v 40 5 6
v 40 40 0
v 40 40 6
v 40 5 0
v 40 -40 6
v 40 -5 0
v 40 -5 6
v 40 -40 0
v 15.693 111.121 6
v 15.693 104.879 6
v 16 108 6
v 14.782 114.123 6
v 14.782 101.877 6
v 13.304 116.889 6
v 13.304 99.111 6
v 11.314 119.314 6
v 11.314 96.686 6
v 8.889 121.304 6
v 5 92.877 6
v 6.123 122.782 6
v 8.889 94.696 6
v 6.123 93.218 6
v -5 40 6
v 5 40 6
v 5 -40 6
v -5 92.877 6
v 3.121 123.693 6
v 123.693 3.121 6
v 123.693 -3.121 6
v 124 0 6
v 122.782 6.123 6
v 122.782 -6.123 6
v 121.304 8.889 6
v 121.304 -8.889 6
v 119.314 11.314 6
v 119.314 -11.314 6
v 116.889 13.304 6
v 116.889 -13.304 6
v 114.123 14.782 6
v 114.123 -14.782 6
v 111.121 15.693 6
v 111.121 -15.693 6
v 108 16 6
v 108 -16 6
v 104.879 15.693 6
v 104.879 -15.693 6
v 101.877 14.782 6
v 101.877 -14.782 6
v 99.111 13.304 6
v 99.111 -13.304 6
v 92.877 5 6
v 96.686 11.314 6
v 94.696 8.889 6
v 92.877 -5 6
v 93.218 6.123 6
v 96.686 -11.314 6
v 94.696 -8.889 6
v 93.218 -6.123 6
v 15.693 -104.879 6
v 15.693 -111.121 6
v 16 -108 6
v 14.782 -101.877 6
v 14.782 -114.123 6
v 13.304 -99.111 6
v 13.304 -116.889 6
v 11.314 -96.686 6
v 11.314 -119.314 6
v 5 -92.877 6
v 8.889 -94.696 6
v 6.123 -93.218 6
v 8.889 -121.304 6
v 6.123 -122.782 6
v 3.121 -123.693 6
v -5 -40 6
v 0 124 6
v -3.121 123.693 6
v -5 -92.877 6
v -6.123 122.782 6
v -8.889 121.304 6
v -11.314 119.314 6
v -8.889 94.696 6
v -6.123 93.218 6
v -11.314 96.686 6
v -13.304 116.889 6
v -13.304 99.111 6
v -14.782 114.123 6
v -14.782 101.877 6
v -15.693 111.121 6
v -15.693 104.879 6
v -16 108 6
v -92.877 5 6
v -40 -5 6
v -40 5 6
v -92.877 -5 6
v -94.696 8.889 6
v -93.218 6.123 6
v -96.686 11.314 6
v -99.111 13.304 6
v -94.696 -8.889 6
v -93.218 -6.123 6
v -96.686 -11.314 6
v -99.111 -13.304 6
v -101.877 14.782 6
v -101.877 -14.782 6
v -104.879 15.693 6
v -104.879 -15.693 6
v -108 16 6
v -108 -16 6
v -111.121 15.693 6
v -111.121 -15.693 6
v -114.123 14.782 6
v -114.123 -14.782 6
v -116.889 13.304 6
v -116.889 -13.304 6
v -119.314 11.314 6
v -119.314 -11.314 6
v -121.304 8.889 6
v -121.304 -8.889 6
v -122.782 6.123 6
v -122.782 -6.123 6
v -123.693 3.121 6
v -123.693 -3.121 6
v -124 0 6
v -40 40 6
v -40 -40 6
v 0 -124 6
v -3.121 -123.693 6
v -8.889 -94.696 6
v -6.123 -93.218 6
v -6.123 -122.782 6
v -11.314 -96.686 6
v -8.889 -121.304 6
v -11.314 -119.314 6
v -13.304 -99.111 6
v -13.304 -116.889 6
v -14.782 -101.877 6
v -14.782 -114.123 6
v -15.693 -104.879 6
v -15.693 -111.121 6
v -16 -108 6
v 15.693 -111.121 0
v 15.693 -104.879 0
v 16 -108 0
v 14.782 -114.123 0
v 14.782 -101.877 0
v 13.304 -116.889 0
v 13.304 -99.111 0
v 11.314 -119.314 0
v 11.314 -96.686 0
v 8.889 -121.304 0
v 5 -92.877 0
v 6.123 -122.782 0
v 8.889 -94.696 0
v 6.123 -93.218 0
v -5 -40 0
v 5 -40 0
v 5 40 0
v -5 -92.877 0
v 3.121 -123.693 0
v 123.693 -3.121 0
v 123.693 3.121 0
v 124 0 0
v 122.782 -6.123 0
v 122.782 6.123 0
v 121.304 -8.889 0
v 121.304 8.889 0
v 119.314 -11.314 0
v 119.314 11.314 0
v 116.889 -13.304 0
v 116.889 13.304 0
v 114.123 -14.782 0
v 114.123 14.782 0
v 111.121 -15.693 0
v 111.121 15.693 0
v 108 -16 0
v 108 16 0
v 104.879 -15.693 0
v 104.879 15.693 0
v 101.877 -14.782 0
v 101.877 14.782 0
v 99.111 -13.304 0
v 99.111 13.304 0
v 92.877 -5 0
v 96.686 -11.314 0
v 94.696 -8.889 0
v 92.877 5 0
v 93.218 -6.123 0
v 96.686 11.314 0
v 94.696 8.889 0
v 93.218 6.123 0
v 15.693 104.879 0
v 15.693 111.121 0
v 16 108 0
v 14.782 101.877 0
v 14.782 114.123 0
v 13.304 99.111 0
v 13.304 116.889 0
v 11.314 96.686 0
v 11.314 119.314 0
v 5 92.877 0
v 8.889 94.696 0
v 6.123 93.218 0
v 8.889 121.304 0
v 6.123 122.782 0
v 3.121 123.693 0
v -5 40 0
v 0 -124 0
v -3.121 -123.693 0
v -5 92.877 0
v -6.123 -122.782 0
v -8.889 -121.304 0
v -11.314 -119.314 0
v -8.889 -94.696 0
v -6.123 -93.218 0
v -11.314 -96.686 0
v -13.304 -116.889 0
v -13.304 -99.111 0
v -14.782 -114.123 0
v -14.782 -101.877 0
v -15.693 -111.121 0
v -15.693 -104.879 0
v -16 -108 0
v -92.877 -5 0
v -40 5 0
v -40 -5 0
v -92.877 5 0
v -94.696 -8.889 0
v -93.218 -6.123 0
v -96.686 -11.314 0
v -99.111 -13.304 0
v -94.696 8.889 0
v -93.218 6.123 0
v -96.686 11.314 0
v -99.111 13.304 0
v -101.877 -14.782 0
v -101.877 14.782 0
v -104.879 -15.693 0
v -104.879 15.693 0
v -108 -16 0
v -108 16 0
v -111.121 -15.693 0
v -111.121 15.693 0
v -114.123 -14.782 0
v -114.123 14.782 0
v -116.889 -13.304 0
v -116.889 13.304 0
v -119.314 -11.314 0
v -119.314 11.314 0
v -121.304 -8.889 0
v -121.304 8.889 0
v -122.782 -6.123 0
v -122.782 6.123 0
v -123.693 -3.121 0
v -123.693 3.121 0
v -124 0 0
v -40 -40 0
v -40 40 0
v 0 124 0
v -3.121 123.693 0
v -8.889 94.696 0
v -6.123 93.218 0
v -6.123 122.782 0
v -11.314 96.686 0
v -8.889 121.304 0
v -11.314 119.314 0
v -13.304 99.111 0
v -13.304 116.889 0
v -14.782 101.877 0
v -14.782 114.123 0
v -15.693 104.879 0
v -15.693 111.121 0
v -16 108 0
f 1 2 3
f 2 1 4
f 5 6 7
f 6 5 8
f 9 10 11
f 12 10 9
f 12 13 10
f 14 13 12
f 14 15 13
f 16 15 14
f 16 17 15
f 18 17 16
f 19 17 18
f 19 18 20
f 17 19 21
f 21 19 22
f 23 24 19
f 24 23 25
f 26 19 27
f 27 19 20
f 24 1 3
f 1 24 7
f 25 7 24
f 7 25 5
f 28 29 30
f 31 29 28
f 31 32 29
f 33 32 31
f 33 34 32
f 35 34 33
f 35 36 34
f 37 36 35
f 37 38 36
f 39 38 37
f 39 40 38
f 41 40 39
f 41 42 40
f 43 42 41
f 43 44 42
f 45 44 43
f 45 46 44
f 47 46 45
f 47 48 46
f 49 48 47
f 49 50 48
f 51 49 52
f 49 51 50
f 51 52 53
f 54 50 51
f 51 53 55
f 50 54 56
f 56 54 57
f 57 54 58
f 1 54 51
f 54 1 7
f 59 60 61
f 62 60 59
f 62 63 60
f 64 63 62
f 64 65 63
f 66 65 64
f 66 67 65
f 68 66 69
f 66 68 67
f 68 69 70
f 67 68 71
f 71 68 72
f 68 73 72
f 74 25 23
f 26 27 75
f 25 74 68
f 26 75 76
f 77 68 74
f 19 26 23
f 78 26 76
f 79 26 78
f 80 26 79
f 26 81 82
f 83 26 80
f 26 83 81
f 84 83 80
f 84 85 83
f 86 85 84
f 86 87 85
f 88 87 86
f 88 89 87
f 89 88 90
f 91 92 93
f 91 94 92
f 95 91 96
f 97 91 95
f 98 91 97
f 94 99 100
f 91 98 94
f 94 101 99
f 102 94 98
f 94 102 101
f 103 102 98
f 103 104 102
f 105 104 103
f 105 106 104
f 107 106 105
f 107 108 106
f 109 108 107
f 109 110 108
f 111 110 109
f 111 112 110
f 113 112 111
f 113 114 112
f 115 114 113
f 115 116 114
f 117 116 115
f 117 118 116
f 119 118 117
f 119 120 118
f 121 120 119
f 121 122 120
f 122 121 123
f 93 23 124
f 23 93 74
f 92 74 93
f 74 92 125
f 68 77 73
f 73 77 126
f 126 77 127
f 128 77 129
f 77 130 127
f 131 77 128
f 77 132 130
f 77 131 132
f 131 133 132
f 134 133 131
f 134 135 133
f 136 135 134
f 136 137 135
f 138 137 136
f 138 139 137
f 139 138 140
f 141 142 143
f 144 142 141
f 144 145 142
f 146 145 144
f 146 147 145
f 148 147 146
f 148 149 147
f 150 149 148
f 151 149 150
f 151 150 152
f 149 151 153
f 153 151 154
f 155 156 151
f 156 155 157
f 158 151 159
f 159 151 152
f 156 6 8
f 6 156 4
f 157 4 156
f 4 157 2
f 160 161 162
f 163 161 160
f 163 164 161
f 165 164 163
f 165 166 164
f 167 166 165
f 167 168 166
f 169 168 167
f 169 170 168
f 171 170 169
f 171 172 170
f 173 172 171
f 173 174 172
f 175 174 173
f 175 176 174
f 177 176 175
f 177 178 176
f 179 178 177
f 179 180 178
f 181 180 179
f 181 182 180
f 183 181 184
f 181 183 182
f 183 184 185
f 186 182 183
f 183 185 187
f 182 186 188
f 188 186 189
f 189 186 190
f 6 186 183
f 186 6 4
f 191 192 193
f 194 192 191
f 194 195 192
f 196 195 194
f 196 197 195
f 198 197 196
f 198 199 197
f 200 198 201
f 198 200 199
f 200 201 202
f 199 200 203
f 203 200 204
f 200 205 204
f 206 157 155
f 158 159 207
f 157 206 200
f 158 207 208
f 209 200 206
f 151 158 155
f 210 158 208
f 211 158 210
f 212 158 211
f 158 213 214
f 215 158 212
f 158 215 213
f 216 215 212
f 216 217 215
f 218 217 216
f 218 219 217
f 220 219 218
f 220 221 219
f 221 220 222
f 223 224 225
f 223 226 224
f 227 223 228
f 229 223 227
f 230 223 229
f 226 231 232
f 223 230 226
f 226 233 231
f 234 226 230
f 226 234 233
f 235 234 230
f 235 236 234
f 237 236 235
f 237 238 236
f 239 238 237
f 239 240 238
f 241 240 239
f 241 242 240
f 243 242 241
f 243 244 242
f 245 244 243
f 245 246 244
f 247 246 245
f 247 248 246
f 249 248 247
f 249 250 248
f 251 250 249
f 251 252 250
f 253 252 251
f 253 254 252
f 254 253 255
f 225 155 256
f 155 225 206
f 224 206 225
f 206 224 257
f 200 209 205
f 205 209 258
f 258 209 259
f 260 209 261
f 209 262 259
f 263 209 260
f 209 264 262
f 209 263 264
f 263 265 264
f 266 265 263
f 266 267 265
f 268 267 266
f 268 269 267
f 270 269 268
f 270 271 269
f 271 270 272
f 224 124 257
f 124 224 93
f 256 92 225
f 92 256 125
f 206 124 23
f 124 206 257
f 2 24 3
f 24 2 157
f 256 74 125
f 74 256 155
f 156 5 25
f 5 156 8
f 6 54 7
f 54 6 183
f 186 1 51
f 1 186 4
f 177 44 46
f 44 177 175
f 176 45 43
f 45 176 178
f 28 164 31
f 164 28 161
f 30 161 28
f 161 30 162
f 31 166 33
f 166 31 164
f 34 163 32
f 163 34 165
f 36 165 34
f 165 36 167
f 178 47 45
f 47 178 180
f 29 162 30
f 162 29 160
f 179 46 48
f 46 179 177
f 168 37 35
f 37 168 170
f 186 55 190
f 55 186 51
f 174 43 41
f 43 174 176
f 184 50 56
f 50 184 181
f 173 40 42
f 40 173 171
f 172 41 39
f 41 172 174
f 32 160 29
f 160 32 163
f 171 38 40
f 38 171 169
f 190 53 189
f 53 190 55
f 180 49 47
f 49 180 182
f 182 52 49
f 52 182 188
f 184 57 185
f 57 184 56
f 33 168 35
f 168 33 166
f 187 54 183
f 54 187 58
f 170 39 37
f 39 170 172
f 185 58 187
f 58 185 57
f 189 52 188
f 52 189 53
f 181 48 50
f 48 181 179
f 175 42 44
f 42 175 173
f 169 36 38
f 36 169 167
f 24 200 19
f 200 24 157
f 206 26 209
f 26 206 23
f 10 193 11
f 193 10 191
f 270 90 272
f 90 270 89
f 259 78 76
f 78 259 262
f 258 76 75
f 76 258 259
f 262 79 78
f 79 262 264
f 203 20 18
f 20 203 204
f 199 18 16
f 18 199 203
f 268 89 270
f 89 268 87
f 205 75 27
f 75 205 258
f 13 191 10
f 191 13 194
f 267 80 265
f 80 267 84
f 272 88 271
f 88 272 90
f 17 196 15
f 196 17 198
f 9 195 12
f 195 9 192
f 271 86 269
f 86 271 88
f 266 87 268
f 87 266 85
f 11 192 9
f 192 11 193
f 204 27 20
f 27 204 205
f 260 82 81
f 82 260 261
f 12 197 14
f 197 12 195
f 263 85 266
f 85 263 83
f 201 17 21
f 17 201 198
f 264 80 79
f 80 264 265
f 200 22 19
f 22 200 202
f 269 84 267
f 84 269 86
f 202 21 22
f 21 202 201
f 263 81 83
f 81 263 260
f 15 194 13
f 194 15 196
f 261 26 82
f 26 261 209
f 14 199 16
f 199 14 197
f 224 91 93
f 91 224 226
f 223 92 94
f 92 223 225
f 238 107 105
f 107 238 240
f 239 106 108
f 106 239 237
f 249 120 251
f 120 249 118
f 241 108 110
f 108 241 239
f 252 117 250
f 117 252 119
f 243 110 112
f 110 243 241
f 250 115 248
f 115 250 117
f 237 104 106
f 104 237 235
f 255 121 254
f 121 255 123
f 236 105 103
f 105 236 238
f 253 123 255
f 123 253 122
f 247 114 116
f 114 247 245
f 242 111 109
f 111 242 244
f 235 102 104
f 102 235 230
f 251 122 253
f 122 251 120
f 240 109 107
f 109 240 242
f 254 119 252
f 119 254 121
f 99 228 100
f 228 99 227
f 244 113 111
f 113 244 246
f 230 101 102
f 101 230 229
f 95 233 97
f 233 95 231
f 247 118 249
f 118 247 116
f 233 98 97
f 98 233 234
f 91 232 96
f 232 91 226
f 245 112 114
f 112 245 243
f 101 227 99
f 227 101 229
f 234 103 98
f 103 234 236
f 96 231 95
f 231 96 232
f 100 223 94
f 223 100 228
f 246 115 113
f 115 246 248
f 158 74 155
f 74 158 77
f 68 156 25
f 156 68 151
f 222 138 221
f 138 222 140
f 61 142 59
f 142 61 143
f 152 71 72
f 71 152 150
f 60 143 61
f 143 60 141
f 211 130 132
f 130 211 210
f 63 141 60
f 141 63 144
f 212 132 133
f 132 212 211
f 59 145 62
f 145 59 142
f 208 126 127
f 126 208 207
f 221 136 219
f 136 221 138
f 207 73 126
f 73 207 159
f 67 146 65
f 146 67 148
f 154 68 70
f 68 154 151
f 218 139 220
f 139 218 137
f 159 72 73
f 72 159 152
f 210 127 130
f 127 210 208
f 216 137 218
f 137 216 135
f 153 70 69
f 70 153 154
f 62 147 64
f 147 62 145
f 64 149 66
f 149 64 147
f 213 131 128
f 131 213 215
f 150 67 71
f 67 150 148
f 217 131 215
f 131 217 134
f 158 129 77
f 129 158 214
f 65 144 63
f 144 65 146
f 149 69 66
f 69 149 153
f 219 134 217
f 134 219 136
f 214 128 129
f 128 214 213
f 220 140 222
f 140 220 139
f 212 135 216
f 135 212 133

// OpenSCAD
$fn = 32;

// ----------------------------------------------------------------------
// Quadcopter frame: 248 mm across the motor pads, arms 108 mm
// ----------------------------------------------------------------------

// --- parameters (mm) ---
hub = 80;                 // central plate size
plate_t = 6;              // plate thickness
arm_len = 108;            // hub centre to motor pad centre
bar_w = 10;               // arm width
pad_d = 32;               // motor pad diameter

module arm_bar() {
  /* flat bar: hull of a stub inside the hub and a box at the pad */
  hull() {
    translate([hub / 4, 0, plate_t / 2]) cube([bar_w, bar_w, plate_t], center = true);
    translate([arm_len, 0, plate_t / 2]) cube([bar_w, bar_w, plate_t], center = true);
  }
}

module pad() {
  translate([arm_len, 0, 0]) cylinder(h = plate_t, d = pad_d);
}

module frame() {
  translate([-hub / 2, -hub / 2, 0]) cube([hub, hub, plate_t]);
  rotate([0, 0, 0]) arm_bar();
  rotate([0, 0, 0]) pad();
  rotate([0, 0, 90]) arm_bar();
  rotate([0, 0, 90]) pad();
  rotate([0, 0, 180]) arm_bar();
  rotate([0, 0, 180]) pad();
  rotate([0, 0, 270]) arm_bar();
  rotate([0, 0, 270]) pad();
}

difference() {
  frame();
}
